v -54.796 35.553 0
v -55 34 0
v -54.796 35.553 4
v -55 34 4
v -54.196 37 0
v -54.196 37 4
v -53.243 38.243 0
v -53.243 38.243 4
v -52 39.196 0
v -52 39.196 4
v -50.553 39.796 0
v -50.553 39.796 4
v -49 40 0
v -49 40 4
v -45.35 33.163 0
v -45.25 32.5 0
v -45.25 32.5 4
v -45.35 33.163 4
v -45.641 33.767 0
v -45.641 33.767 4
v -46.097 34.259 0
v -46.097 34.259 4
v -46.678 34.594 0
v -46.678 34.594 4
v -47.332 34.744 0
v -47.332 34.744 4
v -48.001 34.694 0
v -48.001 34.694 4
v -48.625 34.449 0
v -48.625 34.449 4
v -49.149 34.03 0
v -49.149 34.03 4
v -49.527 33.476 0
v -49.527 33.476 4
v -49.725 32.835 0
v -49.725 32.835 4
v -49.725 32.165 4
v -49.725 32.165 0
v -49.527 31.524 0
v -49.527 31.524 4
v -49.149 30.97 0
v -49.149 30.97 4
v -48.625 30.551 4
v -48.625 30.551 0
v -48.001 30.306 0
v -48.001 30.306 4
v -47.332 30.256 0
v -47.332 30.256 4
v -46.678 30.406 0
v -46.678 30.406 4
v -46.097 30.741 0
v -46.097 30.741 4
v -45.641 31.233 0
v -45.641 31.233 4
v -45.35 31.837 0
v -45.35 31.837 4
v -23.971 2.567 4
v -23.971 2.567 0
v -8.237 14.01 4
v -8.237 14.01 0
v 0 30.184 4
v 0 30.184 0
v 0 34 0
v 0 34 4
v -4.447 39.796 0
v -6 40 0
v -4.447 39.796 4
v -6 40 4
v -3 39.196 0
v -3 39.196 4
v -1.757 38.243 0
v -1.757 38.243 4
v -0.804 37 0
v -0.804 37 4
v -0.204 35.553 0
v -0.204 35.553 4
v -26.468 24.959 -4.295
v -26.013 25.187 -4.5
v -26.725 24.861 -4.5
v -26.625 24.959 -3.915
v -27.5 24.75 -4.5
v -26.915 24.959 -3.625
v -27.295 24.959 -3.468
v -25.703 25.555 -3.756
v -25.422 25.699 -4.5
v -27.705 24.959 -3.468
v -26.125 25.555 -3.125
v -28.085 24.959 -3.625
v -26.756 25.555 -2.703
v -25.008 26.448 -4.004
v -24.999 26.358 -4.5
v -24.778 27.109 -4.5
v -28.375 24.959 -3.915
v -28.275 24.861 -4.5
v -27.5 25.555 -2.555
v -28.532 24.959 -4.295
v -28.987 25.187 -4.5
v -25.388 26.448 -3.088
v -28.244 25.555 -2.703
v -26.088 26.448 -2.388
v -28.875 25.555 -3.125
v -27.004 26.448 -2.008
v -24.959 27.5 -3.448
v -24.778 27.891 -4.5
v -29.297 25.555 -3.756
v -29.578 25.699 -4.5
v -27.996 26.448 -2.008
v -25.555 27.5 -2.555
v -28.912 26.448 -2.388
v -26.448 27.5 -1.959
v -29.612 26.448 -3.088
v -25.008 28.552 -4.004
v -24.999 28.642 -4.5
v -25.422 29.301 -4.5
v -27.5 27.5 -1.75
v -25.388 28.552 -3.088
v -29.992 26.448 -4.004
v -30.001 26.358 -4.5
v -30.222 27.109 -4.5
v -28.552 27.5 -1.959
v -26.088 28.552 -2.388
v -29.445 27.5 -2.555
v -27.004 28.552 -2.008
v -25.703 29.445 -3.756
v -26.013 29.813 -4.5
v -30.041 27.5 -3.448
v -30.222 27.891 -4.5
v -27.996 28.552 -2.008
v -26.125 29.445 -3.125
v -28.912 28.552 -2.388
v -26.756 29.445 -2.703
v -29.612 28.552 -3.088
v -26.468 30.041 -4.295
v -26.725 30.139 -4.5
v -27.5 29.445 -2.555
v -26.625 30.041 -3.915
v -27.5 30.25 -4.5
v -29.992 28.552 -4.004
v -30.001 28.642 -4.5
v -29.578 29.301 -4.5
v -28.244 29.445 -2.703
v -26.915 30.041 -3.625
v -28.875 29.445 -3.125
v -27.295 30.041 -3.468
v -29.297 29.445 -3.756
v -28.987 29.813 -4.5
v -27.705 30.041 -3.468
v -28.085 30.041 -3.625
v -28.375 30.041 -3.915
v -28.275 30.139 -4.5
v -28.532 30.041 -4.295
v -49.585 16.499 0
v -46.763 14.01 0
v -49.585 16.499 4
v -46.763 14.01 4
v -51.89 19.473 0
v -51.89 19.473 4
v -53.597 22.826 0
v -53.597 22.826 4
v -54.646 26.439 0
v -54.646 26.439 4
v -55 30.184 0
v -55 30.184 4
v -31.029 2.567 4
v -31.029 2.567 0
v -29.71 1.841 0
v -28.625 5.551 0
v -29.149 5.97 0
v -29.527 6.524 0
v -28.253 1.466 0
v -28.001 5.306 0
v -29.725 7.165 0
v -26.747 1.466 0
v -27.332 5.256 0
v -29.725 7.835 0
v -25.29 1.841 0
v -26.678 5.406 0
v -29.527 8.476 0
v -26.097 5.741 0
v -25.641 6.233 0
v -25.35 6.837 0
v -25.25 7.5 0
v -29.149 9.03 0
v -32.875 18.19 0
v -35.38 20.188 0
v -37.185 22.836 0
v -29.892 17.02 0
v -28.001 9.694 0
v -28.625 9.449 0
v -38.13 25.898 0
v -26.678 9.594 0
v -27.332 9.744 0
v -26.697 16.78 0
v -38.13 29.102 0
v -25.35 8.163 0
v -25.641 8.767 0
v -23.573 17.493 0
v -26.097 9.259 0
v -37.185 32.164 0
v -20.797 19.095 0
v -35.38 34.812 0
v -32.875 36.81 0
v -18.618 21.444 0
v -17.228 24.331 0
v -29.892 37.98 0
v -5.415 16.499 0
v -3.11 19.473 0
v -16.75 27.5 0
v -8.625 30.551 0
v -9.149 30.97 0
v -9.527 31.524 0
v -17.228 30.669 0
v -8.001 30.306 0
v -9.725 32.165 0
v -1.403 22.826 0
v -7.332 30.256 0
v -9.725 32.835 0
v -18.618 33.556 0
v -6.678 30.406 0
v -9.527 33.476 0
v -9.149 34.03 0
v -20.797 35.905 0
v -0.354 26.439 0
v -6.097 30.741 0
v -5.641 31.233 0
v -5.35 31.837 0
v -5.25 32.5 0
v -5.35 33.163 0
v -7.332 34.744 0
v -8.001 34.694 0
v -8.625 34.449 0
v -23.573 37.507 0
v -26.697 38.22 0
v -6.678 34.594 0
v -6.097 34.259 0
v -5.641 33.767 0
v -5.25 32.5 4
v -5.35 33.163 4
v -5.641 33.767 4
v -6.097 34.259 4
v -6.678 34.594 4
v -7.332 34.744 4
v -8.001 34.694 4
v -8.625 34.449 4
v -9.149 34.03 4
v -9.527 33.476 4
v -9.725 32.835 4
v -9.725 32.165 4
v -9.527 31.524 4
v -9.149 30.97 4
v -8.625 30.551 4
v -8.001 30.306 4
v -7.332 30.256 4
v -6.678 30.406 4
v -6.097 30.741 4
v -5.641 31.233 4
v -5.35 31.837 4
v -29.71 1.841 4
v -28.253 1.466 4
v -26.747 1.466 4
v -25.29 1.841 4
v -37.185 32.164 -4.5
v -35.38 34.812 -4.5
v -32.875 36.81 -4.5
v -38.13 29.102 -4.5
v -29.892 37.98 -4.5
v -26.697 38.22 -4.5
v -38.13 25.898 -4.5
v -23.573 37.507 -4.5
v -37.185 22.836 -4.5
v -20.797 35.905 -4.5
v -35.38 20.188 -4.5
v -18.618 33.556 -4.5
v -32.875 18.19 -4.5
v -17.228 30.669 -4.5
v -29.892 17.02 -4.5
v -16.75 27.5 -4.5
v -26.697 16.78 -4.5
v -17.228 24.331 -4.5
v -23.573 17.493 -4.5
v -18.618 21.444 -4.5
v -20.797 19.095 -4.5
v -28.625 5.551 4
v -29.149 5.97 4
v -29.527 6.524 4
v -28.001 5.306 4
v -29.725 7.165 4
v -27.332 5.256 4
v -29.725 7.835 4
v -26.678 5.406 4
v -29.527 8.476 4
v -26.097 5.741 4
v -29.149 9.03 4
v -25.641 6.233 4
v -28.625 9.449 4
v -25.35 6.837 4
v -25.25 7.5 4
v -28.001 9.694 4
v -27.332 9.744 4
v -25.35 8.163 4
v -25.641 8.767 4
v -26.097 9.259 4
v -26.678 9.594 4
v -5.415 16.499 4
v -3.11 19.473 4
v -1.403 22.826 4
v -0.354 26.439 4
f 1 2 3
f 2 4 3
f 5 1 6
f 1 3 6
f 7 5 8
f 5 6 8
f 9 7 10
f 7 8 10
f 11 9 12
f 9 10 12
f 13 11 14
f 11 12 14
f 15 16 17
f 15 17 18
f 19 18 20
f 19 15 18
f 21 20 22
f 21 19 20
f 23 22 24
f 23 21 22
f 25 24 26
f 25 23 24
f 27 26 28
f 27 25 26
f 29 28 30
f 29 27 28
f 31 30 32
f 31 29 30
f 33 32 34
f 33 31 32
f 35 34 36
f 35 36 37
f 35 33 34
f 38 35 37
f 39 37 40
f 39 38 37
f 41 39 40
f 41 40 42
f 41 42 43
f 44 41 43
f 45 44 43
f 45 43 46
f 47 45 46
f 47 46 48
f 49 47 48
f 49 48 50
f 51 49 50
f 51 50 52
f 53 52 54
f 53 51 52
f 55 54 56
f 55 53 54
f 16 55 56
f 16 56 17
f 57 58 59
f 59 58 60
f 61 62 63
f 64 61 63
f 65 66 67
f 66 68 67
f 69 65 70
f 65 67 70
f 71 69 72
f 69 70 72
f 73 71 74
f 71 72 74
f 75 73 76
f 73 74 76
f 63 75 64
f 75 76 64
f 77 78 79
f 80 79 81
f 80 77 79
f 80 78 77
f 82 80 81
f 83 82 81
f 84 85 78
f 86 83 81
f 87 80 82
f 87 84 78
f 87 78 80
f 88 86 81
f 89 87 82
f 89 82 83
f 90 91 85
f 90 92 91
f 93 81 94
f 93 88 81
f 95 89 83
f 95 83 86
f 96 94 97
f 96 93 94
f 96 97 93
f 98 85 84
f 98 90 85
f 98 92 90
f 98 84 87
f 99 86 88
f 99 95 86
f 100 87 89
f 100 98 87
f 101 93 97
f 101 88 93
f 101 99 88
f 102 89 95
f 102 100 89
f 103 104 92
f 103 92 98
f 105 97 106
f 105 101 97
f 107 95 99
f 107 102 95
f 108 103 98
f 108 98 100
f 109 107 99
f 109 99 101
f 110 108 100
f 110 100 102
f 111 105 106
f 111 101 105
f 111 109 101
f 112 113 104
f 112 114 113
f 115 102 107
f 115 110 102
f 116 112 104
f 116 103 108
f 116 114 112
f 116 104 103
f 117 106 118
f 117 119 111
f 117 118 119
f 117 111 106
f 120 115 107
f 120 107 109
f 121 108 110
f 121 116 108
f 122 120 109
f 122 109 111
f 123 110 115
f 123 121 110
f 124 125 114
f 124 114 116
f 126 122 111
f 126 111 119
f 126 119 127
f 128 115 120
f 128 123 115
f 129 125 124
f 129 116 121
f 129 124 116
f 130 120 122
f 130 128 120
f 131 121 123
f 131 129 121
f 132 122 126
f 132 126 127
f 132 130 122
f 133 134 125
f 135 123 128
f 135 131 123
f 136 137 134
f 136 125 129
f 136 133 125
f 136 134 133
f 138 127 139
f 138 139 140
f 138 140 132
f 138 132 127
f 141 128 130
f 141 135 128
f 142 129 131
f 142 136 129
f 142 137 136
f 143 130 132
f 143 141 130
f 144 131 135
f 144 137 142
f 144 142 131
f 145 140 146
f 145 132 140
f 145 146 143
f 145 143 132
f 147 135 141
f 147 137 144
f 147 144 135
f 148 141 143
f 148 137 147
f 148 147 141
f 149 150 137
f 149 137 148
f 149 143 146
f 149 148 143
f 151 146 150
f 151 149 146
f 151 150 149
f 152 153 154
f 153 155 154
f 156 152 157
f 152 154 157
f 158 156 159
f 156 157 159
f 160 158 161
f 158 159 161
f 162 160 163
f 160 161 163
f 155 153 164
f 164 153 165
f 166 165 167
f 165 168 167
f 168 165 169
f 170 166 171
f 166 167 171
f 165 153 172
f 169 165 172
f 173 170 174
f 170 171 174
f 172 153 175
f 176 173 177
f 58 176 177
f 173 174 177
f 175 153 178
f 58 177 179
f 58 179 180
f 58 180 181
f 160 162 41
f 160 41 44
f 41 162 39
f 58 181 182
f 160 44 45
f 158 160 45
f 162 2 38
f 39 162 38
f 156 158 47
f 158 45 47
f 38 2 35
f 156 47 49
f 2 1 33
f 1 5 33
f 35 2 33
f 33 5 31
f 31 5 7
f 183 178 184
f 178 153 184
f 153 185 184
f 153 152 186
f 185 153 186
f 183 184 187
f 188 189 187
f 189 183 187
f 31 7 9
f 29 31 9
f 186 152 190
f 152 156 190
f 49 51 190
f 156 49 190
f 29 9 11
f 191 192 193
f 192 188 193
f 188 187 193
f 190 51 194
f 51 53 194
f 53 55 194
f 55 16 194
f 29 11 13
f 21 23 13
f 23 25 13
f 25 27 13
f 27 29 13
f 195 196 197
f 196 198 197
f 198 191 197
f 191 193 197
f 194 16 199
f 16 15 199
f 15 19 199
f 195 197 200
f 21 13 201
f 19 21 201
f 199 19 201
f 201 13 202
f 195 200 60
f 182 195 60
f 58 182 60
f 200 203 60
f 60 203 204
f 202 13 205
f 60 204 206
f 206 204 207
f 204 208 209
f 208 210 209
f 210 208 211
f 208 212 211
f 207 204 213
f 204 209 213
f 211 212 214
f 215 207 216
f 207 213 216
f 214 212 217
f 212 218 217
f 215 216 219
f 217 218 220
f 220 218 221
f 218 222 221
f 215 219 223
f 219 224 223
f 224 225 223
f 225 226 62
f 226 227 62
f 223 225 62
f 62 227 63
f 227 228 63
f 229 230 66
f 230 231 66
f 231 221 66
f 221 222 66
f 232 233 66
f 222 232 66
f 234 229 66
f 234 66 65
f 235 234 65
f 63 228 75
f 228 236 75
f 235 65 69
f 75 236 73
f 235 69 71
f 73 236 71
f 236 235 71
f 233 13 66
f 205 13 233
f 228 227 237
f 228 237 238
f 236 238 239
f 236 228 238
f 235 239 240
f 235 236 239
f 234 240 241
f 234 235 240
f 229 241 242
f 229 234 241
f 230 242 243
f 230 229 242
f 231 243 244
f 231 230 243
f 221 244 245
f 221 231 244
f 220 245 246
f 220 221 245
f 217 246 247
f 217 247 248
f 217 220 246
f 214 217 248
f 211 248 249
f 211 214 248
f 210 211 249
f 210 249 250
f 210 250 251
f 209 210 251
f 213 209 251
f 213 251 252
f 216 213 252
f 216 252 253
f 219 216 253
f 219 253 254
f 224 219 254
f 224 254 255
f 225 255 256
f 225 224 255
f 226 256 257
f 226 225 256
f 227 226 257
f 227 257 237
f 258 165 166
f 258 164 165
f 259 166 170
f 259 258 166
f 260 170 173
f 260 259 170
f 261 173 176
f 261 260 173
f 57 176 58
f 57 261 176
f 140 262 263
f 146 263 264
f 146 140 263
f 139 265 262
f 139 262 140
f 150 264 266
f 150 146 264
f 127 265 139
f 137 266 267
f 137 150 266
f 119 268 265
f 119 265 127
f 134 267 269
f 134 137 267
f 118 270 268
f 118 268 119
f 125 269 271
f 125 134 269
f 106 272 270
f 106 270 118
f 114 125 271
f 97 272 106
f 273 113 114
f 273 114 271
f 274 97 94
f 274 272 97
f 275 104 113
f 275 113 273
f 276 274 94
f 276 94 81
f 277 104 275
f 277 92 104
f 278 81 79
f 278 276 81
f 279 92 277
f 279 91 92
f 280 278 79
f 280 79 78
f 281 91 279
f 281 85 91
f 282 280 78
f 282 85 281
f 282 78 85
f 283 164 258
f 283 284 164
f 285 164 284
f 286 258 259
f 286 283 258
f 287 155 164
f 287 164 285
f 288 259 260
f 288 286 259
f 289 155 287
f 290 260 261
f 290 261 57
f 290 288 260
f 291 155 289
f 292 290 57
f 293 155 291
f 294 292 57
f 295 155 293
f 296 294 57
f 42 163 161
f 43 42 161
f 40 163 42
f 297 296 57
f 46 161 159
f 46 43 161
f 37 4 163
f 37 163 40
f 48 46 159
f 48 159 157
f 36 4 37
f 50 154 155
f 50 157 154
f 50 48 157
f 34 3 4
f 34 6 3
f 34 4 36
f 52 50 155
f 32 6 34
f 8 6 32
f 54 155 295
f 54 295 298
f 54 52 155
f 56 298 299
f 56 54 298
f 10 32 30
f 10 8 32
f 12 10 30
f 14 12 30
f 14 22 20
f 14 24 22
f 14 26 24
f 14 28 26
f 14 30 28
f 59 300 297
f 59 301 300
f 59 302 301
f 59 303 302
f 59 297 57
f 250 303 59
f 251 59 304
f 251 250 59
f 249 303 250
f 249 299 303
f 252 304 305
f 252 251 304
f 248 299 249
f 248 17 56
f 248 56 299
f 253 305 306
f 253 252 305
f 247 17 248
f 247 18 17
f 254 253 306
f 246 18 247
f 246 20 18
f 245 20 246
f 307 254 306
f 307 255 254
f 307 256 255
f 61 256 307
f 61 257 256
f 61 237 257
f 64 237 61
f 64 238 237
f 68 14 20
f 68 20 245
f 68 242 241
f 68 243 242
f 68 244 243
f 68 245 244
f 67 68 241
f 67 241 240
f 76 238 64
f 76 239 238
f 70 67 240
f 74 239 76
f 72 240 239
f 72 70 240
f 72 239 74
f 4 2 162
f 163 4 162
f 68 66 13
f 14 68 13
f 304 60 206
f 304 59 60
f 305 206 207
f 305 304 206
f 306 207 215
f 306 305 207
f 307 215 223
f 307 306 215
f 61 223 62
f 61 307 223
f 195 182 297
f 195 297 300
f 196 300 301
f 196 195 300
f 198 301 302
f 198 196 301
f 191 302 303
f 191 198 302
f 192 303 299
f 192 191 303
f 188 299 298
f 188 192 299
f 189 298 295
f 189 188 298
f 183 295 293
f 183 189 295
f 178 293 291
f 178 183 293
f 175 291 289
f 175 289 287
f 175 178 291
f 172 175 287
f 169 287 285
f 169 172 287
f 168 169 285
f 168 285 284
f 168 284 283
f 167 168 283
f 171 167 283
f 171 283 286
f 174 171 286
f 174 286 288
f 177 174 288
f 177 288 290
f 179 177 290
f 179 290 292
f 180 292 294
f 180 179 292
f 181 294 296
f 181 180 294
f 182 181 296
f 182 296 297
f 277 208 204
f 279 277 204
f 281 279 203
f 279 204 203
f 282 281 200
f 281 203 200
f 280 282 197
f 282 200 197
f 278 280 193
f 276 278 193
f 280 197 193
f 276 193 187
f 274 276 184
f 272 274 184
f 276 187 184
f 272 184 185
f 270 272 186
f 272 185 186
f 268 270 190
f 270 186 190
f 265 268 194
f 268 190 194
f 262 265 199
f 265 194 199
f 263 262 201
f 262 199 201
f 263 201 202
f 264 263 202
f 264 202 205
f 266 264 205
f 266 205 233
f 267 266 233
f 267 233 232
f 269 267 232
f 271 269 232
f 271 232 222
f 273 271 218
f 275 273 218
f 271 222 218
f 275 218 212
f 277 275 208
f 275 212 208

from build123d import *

# Parameters (mm, degrees)
ESQUISSE1_R        = 2.25
BOSS_EXTRU_1_DEPTH = 4
CONG_2_R           = 6
CONG_3_R           = 20
ESQUISSE2_R        = 10.75
BOSS_EXTRU_2_DEPTH = 4.5


with BuildPart() as part:
    # Esquisse1 → Boss.-Extru.1 (new body)
    with BuildSketch(Plane.XY):
        Polygon((-55, 20), (-27.5, 0), (0, 20), (0, 40), (-55, 40), align=None)
        with Locations((-47.5, 32.5)):
            Circle(ESQUISSE1_R, mode=Mode.SUBTRACT)
        with Locations((-7.5, 32.5)):
            Circle(ESQUISSE1_R, mode=Mode.SUBTRACT)
        with Locations((-27.5, 7.5)):
            Circle(ESQUISSE1_R, mode=Mode.SUBTRACT)
    extrude(amount=BOSS_EXTRU_1_DEPTH)

    # Congé2
    cong_2_edges = [part.edges().sort_by_distance(p)[0] for p in [
        (-55, 40, 2),
        (0, 40, 2),
        (-27.5, 0, 2),
    ]]
    fillet(cong_2_edges, radius=CONG_2_R)

    # Congé3
    cong_3_edges = [part.edges().sort_by_distance(p)[0] for p in [
        (0, 20, 2),
        (-55, 20, 2),
    ]]
    fillet(cong_3_edges, radius=CONG_3_R)

    # Esquisse2 → Boss.-Extru.2 (add)
    with BuildSketch(Plane(origin=(0, 0, 0), x_dir=(-1, 0, 0), z_dir=(0, 0, -1))):
        with Locations(Location((27.5, 27.5, 0), (0, 0, 180))):  # turned: the seam where the file's is
            Circle(ESQUISSE2_R)
    extrude(amount=BOSS_EXTRU_2_DEPTH)

    # Esquisse3 → Enlèvement de matière-Révolution5 (revolve, cut)
    with BuildSketch(Plane(origin=(0, 0, -4.5), x_dir=(-1, 0, 0), z_dir=(0, 0, -1))):
        with BuildLine():
            Line((27.5, 30.25), (27.5, 24.75))
            ThreePointArc((27.5, 24.75), (24.75, 27.5), (27.5, 30.25))
        make_face()
    revolve(axis=Axis((-27.5, 30.25, -4.5), (0, -1, 0)), mode=Mode.SUBTRACT)


solid = part.part
